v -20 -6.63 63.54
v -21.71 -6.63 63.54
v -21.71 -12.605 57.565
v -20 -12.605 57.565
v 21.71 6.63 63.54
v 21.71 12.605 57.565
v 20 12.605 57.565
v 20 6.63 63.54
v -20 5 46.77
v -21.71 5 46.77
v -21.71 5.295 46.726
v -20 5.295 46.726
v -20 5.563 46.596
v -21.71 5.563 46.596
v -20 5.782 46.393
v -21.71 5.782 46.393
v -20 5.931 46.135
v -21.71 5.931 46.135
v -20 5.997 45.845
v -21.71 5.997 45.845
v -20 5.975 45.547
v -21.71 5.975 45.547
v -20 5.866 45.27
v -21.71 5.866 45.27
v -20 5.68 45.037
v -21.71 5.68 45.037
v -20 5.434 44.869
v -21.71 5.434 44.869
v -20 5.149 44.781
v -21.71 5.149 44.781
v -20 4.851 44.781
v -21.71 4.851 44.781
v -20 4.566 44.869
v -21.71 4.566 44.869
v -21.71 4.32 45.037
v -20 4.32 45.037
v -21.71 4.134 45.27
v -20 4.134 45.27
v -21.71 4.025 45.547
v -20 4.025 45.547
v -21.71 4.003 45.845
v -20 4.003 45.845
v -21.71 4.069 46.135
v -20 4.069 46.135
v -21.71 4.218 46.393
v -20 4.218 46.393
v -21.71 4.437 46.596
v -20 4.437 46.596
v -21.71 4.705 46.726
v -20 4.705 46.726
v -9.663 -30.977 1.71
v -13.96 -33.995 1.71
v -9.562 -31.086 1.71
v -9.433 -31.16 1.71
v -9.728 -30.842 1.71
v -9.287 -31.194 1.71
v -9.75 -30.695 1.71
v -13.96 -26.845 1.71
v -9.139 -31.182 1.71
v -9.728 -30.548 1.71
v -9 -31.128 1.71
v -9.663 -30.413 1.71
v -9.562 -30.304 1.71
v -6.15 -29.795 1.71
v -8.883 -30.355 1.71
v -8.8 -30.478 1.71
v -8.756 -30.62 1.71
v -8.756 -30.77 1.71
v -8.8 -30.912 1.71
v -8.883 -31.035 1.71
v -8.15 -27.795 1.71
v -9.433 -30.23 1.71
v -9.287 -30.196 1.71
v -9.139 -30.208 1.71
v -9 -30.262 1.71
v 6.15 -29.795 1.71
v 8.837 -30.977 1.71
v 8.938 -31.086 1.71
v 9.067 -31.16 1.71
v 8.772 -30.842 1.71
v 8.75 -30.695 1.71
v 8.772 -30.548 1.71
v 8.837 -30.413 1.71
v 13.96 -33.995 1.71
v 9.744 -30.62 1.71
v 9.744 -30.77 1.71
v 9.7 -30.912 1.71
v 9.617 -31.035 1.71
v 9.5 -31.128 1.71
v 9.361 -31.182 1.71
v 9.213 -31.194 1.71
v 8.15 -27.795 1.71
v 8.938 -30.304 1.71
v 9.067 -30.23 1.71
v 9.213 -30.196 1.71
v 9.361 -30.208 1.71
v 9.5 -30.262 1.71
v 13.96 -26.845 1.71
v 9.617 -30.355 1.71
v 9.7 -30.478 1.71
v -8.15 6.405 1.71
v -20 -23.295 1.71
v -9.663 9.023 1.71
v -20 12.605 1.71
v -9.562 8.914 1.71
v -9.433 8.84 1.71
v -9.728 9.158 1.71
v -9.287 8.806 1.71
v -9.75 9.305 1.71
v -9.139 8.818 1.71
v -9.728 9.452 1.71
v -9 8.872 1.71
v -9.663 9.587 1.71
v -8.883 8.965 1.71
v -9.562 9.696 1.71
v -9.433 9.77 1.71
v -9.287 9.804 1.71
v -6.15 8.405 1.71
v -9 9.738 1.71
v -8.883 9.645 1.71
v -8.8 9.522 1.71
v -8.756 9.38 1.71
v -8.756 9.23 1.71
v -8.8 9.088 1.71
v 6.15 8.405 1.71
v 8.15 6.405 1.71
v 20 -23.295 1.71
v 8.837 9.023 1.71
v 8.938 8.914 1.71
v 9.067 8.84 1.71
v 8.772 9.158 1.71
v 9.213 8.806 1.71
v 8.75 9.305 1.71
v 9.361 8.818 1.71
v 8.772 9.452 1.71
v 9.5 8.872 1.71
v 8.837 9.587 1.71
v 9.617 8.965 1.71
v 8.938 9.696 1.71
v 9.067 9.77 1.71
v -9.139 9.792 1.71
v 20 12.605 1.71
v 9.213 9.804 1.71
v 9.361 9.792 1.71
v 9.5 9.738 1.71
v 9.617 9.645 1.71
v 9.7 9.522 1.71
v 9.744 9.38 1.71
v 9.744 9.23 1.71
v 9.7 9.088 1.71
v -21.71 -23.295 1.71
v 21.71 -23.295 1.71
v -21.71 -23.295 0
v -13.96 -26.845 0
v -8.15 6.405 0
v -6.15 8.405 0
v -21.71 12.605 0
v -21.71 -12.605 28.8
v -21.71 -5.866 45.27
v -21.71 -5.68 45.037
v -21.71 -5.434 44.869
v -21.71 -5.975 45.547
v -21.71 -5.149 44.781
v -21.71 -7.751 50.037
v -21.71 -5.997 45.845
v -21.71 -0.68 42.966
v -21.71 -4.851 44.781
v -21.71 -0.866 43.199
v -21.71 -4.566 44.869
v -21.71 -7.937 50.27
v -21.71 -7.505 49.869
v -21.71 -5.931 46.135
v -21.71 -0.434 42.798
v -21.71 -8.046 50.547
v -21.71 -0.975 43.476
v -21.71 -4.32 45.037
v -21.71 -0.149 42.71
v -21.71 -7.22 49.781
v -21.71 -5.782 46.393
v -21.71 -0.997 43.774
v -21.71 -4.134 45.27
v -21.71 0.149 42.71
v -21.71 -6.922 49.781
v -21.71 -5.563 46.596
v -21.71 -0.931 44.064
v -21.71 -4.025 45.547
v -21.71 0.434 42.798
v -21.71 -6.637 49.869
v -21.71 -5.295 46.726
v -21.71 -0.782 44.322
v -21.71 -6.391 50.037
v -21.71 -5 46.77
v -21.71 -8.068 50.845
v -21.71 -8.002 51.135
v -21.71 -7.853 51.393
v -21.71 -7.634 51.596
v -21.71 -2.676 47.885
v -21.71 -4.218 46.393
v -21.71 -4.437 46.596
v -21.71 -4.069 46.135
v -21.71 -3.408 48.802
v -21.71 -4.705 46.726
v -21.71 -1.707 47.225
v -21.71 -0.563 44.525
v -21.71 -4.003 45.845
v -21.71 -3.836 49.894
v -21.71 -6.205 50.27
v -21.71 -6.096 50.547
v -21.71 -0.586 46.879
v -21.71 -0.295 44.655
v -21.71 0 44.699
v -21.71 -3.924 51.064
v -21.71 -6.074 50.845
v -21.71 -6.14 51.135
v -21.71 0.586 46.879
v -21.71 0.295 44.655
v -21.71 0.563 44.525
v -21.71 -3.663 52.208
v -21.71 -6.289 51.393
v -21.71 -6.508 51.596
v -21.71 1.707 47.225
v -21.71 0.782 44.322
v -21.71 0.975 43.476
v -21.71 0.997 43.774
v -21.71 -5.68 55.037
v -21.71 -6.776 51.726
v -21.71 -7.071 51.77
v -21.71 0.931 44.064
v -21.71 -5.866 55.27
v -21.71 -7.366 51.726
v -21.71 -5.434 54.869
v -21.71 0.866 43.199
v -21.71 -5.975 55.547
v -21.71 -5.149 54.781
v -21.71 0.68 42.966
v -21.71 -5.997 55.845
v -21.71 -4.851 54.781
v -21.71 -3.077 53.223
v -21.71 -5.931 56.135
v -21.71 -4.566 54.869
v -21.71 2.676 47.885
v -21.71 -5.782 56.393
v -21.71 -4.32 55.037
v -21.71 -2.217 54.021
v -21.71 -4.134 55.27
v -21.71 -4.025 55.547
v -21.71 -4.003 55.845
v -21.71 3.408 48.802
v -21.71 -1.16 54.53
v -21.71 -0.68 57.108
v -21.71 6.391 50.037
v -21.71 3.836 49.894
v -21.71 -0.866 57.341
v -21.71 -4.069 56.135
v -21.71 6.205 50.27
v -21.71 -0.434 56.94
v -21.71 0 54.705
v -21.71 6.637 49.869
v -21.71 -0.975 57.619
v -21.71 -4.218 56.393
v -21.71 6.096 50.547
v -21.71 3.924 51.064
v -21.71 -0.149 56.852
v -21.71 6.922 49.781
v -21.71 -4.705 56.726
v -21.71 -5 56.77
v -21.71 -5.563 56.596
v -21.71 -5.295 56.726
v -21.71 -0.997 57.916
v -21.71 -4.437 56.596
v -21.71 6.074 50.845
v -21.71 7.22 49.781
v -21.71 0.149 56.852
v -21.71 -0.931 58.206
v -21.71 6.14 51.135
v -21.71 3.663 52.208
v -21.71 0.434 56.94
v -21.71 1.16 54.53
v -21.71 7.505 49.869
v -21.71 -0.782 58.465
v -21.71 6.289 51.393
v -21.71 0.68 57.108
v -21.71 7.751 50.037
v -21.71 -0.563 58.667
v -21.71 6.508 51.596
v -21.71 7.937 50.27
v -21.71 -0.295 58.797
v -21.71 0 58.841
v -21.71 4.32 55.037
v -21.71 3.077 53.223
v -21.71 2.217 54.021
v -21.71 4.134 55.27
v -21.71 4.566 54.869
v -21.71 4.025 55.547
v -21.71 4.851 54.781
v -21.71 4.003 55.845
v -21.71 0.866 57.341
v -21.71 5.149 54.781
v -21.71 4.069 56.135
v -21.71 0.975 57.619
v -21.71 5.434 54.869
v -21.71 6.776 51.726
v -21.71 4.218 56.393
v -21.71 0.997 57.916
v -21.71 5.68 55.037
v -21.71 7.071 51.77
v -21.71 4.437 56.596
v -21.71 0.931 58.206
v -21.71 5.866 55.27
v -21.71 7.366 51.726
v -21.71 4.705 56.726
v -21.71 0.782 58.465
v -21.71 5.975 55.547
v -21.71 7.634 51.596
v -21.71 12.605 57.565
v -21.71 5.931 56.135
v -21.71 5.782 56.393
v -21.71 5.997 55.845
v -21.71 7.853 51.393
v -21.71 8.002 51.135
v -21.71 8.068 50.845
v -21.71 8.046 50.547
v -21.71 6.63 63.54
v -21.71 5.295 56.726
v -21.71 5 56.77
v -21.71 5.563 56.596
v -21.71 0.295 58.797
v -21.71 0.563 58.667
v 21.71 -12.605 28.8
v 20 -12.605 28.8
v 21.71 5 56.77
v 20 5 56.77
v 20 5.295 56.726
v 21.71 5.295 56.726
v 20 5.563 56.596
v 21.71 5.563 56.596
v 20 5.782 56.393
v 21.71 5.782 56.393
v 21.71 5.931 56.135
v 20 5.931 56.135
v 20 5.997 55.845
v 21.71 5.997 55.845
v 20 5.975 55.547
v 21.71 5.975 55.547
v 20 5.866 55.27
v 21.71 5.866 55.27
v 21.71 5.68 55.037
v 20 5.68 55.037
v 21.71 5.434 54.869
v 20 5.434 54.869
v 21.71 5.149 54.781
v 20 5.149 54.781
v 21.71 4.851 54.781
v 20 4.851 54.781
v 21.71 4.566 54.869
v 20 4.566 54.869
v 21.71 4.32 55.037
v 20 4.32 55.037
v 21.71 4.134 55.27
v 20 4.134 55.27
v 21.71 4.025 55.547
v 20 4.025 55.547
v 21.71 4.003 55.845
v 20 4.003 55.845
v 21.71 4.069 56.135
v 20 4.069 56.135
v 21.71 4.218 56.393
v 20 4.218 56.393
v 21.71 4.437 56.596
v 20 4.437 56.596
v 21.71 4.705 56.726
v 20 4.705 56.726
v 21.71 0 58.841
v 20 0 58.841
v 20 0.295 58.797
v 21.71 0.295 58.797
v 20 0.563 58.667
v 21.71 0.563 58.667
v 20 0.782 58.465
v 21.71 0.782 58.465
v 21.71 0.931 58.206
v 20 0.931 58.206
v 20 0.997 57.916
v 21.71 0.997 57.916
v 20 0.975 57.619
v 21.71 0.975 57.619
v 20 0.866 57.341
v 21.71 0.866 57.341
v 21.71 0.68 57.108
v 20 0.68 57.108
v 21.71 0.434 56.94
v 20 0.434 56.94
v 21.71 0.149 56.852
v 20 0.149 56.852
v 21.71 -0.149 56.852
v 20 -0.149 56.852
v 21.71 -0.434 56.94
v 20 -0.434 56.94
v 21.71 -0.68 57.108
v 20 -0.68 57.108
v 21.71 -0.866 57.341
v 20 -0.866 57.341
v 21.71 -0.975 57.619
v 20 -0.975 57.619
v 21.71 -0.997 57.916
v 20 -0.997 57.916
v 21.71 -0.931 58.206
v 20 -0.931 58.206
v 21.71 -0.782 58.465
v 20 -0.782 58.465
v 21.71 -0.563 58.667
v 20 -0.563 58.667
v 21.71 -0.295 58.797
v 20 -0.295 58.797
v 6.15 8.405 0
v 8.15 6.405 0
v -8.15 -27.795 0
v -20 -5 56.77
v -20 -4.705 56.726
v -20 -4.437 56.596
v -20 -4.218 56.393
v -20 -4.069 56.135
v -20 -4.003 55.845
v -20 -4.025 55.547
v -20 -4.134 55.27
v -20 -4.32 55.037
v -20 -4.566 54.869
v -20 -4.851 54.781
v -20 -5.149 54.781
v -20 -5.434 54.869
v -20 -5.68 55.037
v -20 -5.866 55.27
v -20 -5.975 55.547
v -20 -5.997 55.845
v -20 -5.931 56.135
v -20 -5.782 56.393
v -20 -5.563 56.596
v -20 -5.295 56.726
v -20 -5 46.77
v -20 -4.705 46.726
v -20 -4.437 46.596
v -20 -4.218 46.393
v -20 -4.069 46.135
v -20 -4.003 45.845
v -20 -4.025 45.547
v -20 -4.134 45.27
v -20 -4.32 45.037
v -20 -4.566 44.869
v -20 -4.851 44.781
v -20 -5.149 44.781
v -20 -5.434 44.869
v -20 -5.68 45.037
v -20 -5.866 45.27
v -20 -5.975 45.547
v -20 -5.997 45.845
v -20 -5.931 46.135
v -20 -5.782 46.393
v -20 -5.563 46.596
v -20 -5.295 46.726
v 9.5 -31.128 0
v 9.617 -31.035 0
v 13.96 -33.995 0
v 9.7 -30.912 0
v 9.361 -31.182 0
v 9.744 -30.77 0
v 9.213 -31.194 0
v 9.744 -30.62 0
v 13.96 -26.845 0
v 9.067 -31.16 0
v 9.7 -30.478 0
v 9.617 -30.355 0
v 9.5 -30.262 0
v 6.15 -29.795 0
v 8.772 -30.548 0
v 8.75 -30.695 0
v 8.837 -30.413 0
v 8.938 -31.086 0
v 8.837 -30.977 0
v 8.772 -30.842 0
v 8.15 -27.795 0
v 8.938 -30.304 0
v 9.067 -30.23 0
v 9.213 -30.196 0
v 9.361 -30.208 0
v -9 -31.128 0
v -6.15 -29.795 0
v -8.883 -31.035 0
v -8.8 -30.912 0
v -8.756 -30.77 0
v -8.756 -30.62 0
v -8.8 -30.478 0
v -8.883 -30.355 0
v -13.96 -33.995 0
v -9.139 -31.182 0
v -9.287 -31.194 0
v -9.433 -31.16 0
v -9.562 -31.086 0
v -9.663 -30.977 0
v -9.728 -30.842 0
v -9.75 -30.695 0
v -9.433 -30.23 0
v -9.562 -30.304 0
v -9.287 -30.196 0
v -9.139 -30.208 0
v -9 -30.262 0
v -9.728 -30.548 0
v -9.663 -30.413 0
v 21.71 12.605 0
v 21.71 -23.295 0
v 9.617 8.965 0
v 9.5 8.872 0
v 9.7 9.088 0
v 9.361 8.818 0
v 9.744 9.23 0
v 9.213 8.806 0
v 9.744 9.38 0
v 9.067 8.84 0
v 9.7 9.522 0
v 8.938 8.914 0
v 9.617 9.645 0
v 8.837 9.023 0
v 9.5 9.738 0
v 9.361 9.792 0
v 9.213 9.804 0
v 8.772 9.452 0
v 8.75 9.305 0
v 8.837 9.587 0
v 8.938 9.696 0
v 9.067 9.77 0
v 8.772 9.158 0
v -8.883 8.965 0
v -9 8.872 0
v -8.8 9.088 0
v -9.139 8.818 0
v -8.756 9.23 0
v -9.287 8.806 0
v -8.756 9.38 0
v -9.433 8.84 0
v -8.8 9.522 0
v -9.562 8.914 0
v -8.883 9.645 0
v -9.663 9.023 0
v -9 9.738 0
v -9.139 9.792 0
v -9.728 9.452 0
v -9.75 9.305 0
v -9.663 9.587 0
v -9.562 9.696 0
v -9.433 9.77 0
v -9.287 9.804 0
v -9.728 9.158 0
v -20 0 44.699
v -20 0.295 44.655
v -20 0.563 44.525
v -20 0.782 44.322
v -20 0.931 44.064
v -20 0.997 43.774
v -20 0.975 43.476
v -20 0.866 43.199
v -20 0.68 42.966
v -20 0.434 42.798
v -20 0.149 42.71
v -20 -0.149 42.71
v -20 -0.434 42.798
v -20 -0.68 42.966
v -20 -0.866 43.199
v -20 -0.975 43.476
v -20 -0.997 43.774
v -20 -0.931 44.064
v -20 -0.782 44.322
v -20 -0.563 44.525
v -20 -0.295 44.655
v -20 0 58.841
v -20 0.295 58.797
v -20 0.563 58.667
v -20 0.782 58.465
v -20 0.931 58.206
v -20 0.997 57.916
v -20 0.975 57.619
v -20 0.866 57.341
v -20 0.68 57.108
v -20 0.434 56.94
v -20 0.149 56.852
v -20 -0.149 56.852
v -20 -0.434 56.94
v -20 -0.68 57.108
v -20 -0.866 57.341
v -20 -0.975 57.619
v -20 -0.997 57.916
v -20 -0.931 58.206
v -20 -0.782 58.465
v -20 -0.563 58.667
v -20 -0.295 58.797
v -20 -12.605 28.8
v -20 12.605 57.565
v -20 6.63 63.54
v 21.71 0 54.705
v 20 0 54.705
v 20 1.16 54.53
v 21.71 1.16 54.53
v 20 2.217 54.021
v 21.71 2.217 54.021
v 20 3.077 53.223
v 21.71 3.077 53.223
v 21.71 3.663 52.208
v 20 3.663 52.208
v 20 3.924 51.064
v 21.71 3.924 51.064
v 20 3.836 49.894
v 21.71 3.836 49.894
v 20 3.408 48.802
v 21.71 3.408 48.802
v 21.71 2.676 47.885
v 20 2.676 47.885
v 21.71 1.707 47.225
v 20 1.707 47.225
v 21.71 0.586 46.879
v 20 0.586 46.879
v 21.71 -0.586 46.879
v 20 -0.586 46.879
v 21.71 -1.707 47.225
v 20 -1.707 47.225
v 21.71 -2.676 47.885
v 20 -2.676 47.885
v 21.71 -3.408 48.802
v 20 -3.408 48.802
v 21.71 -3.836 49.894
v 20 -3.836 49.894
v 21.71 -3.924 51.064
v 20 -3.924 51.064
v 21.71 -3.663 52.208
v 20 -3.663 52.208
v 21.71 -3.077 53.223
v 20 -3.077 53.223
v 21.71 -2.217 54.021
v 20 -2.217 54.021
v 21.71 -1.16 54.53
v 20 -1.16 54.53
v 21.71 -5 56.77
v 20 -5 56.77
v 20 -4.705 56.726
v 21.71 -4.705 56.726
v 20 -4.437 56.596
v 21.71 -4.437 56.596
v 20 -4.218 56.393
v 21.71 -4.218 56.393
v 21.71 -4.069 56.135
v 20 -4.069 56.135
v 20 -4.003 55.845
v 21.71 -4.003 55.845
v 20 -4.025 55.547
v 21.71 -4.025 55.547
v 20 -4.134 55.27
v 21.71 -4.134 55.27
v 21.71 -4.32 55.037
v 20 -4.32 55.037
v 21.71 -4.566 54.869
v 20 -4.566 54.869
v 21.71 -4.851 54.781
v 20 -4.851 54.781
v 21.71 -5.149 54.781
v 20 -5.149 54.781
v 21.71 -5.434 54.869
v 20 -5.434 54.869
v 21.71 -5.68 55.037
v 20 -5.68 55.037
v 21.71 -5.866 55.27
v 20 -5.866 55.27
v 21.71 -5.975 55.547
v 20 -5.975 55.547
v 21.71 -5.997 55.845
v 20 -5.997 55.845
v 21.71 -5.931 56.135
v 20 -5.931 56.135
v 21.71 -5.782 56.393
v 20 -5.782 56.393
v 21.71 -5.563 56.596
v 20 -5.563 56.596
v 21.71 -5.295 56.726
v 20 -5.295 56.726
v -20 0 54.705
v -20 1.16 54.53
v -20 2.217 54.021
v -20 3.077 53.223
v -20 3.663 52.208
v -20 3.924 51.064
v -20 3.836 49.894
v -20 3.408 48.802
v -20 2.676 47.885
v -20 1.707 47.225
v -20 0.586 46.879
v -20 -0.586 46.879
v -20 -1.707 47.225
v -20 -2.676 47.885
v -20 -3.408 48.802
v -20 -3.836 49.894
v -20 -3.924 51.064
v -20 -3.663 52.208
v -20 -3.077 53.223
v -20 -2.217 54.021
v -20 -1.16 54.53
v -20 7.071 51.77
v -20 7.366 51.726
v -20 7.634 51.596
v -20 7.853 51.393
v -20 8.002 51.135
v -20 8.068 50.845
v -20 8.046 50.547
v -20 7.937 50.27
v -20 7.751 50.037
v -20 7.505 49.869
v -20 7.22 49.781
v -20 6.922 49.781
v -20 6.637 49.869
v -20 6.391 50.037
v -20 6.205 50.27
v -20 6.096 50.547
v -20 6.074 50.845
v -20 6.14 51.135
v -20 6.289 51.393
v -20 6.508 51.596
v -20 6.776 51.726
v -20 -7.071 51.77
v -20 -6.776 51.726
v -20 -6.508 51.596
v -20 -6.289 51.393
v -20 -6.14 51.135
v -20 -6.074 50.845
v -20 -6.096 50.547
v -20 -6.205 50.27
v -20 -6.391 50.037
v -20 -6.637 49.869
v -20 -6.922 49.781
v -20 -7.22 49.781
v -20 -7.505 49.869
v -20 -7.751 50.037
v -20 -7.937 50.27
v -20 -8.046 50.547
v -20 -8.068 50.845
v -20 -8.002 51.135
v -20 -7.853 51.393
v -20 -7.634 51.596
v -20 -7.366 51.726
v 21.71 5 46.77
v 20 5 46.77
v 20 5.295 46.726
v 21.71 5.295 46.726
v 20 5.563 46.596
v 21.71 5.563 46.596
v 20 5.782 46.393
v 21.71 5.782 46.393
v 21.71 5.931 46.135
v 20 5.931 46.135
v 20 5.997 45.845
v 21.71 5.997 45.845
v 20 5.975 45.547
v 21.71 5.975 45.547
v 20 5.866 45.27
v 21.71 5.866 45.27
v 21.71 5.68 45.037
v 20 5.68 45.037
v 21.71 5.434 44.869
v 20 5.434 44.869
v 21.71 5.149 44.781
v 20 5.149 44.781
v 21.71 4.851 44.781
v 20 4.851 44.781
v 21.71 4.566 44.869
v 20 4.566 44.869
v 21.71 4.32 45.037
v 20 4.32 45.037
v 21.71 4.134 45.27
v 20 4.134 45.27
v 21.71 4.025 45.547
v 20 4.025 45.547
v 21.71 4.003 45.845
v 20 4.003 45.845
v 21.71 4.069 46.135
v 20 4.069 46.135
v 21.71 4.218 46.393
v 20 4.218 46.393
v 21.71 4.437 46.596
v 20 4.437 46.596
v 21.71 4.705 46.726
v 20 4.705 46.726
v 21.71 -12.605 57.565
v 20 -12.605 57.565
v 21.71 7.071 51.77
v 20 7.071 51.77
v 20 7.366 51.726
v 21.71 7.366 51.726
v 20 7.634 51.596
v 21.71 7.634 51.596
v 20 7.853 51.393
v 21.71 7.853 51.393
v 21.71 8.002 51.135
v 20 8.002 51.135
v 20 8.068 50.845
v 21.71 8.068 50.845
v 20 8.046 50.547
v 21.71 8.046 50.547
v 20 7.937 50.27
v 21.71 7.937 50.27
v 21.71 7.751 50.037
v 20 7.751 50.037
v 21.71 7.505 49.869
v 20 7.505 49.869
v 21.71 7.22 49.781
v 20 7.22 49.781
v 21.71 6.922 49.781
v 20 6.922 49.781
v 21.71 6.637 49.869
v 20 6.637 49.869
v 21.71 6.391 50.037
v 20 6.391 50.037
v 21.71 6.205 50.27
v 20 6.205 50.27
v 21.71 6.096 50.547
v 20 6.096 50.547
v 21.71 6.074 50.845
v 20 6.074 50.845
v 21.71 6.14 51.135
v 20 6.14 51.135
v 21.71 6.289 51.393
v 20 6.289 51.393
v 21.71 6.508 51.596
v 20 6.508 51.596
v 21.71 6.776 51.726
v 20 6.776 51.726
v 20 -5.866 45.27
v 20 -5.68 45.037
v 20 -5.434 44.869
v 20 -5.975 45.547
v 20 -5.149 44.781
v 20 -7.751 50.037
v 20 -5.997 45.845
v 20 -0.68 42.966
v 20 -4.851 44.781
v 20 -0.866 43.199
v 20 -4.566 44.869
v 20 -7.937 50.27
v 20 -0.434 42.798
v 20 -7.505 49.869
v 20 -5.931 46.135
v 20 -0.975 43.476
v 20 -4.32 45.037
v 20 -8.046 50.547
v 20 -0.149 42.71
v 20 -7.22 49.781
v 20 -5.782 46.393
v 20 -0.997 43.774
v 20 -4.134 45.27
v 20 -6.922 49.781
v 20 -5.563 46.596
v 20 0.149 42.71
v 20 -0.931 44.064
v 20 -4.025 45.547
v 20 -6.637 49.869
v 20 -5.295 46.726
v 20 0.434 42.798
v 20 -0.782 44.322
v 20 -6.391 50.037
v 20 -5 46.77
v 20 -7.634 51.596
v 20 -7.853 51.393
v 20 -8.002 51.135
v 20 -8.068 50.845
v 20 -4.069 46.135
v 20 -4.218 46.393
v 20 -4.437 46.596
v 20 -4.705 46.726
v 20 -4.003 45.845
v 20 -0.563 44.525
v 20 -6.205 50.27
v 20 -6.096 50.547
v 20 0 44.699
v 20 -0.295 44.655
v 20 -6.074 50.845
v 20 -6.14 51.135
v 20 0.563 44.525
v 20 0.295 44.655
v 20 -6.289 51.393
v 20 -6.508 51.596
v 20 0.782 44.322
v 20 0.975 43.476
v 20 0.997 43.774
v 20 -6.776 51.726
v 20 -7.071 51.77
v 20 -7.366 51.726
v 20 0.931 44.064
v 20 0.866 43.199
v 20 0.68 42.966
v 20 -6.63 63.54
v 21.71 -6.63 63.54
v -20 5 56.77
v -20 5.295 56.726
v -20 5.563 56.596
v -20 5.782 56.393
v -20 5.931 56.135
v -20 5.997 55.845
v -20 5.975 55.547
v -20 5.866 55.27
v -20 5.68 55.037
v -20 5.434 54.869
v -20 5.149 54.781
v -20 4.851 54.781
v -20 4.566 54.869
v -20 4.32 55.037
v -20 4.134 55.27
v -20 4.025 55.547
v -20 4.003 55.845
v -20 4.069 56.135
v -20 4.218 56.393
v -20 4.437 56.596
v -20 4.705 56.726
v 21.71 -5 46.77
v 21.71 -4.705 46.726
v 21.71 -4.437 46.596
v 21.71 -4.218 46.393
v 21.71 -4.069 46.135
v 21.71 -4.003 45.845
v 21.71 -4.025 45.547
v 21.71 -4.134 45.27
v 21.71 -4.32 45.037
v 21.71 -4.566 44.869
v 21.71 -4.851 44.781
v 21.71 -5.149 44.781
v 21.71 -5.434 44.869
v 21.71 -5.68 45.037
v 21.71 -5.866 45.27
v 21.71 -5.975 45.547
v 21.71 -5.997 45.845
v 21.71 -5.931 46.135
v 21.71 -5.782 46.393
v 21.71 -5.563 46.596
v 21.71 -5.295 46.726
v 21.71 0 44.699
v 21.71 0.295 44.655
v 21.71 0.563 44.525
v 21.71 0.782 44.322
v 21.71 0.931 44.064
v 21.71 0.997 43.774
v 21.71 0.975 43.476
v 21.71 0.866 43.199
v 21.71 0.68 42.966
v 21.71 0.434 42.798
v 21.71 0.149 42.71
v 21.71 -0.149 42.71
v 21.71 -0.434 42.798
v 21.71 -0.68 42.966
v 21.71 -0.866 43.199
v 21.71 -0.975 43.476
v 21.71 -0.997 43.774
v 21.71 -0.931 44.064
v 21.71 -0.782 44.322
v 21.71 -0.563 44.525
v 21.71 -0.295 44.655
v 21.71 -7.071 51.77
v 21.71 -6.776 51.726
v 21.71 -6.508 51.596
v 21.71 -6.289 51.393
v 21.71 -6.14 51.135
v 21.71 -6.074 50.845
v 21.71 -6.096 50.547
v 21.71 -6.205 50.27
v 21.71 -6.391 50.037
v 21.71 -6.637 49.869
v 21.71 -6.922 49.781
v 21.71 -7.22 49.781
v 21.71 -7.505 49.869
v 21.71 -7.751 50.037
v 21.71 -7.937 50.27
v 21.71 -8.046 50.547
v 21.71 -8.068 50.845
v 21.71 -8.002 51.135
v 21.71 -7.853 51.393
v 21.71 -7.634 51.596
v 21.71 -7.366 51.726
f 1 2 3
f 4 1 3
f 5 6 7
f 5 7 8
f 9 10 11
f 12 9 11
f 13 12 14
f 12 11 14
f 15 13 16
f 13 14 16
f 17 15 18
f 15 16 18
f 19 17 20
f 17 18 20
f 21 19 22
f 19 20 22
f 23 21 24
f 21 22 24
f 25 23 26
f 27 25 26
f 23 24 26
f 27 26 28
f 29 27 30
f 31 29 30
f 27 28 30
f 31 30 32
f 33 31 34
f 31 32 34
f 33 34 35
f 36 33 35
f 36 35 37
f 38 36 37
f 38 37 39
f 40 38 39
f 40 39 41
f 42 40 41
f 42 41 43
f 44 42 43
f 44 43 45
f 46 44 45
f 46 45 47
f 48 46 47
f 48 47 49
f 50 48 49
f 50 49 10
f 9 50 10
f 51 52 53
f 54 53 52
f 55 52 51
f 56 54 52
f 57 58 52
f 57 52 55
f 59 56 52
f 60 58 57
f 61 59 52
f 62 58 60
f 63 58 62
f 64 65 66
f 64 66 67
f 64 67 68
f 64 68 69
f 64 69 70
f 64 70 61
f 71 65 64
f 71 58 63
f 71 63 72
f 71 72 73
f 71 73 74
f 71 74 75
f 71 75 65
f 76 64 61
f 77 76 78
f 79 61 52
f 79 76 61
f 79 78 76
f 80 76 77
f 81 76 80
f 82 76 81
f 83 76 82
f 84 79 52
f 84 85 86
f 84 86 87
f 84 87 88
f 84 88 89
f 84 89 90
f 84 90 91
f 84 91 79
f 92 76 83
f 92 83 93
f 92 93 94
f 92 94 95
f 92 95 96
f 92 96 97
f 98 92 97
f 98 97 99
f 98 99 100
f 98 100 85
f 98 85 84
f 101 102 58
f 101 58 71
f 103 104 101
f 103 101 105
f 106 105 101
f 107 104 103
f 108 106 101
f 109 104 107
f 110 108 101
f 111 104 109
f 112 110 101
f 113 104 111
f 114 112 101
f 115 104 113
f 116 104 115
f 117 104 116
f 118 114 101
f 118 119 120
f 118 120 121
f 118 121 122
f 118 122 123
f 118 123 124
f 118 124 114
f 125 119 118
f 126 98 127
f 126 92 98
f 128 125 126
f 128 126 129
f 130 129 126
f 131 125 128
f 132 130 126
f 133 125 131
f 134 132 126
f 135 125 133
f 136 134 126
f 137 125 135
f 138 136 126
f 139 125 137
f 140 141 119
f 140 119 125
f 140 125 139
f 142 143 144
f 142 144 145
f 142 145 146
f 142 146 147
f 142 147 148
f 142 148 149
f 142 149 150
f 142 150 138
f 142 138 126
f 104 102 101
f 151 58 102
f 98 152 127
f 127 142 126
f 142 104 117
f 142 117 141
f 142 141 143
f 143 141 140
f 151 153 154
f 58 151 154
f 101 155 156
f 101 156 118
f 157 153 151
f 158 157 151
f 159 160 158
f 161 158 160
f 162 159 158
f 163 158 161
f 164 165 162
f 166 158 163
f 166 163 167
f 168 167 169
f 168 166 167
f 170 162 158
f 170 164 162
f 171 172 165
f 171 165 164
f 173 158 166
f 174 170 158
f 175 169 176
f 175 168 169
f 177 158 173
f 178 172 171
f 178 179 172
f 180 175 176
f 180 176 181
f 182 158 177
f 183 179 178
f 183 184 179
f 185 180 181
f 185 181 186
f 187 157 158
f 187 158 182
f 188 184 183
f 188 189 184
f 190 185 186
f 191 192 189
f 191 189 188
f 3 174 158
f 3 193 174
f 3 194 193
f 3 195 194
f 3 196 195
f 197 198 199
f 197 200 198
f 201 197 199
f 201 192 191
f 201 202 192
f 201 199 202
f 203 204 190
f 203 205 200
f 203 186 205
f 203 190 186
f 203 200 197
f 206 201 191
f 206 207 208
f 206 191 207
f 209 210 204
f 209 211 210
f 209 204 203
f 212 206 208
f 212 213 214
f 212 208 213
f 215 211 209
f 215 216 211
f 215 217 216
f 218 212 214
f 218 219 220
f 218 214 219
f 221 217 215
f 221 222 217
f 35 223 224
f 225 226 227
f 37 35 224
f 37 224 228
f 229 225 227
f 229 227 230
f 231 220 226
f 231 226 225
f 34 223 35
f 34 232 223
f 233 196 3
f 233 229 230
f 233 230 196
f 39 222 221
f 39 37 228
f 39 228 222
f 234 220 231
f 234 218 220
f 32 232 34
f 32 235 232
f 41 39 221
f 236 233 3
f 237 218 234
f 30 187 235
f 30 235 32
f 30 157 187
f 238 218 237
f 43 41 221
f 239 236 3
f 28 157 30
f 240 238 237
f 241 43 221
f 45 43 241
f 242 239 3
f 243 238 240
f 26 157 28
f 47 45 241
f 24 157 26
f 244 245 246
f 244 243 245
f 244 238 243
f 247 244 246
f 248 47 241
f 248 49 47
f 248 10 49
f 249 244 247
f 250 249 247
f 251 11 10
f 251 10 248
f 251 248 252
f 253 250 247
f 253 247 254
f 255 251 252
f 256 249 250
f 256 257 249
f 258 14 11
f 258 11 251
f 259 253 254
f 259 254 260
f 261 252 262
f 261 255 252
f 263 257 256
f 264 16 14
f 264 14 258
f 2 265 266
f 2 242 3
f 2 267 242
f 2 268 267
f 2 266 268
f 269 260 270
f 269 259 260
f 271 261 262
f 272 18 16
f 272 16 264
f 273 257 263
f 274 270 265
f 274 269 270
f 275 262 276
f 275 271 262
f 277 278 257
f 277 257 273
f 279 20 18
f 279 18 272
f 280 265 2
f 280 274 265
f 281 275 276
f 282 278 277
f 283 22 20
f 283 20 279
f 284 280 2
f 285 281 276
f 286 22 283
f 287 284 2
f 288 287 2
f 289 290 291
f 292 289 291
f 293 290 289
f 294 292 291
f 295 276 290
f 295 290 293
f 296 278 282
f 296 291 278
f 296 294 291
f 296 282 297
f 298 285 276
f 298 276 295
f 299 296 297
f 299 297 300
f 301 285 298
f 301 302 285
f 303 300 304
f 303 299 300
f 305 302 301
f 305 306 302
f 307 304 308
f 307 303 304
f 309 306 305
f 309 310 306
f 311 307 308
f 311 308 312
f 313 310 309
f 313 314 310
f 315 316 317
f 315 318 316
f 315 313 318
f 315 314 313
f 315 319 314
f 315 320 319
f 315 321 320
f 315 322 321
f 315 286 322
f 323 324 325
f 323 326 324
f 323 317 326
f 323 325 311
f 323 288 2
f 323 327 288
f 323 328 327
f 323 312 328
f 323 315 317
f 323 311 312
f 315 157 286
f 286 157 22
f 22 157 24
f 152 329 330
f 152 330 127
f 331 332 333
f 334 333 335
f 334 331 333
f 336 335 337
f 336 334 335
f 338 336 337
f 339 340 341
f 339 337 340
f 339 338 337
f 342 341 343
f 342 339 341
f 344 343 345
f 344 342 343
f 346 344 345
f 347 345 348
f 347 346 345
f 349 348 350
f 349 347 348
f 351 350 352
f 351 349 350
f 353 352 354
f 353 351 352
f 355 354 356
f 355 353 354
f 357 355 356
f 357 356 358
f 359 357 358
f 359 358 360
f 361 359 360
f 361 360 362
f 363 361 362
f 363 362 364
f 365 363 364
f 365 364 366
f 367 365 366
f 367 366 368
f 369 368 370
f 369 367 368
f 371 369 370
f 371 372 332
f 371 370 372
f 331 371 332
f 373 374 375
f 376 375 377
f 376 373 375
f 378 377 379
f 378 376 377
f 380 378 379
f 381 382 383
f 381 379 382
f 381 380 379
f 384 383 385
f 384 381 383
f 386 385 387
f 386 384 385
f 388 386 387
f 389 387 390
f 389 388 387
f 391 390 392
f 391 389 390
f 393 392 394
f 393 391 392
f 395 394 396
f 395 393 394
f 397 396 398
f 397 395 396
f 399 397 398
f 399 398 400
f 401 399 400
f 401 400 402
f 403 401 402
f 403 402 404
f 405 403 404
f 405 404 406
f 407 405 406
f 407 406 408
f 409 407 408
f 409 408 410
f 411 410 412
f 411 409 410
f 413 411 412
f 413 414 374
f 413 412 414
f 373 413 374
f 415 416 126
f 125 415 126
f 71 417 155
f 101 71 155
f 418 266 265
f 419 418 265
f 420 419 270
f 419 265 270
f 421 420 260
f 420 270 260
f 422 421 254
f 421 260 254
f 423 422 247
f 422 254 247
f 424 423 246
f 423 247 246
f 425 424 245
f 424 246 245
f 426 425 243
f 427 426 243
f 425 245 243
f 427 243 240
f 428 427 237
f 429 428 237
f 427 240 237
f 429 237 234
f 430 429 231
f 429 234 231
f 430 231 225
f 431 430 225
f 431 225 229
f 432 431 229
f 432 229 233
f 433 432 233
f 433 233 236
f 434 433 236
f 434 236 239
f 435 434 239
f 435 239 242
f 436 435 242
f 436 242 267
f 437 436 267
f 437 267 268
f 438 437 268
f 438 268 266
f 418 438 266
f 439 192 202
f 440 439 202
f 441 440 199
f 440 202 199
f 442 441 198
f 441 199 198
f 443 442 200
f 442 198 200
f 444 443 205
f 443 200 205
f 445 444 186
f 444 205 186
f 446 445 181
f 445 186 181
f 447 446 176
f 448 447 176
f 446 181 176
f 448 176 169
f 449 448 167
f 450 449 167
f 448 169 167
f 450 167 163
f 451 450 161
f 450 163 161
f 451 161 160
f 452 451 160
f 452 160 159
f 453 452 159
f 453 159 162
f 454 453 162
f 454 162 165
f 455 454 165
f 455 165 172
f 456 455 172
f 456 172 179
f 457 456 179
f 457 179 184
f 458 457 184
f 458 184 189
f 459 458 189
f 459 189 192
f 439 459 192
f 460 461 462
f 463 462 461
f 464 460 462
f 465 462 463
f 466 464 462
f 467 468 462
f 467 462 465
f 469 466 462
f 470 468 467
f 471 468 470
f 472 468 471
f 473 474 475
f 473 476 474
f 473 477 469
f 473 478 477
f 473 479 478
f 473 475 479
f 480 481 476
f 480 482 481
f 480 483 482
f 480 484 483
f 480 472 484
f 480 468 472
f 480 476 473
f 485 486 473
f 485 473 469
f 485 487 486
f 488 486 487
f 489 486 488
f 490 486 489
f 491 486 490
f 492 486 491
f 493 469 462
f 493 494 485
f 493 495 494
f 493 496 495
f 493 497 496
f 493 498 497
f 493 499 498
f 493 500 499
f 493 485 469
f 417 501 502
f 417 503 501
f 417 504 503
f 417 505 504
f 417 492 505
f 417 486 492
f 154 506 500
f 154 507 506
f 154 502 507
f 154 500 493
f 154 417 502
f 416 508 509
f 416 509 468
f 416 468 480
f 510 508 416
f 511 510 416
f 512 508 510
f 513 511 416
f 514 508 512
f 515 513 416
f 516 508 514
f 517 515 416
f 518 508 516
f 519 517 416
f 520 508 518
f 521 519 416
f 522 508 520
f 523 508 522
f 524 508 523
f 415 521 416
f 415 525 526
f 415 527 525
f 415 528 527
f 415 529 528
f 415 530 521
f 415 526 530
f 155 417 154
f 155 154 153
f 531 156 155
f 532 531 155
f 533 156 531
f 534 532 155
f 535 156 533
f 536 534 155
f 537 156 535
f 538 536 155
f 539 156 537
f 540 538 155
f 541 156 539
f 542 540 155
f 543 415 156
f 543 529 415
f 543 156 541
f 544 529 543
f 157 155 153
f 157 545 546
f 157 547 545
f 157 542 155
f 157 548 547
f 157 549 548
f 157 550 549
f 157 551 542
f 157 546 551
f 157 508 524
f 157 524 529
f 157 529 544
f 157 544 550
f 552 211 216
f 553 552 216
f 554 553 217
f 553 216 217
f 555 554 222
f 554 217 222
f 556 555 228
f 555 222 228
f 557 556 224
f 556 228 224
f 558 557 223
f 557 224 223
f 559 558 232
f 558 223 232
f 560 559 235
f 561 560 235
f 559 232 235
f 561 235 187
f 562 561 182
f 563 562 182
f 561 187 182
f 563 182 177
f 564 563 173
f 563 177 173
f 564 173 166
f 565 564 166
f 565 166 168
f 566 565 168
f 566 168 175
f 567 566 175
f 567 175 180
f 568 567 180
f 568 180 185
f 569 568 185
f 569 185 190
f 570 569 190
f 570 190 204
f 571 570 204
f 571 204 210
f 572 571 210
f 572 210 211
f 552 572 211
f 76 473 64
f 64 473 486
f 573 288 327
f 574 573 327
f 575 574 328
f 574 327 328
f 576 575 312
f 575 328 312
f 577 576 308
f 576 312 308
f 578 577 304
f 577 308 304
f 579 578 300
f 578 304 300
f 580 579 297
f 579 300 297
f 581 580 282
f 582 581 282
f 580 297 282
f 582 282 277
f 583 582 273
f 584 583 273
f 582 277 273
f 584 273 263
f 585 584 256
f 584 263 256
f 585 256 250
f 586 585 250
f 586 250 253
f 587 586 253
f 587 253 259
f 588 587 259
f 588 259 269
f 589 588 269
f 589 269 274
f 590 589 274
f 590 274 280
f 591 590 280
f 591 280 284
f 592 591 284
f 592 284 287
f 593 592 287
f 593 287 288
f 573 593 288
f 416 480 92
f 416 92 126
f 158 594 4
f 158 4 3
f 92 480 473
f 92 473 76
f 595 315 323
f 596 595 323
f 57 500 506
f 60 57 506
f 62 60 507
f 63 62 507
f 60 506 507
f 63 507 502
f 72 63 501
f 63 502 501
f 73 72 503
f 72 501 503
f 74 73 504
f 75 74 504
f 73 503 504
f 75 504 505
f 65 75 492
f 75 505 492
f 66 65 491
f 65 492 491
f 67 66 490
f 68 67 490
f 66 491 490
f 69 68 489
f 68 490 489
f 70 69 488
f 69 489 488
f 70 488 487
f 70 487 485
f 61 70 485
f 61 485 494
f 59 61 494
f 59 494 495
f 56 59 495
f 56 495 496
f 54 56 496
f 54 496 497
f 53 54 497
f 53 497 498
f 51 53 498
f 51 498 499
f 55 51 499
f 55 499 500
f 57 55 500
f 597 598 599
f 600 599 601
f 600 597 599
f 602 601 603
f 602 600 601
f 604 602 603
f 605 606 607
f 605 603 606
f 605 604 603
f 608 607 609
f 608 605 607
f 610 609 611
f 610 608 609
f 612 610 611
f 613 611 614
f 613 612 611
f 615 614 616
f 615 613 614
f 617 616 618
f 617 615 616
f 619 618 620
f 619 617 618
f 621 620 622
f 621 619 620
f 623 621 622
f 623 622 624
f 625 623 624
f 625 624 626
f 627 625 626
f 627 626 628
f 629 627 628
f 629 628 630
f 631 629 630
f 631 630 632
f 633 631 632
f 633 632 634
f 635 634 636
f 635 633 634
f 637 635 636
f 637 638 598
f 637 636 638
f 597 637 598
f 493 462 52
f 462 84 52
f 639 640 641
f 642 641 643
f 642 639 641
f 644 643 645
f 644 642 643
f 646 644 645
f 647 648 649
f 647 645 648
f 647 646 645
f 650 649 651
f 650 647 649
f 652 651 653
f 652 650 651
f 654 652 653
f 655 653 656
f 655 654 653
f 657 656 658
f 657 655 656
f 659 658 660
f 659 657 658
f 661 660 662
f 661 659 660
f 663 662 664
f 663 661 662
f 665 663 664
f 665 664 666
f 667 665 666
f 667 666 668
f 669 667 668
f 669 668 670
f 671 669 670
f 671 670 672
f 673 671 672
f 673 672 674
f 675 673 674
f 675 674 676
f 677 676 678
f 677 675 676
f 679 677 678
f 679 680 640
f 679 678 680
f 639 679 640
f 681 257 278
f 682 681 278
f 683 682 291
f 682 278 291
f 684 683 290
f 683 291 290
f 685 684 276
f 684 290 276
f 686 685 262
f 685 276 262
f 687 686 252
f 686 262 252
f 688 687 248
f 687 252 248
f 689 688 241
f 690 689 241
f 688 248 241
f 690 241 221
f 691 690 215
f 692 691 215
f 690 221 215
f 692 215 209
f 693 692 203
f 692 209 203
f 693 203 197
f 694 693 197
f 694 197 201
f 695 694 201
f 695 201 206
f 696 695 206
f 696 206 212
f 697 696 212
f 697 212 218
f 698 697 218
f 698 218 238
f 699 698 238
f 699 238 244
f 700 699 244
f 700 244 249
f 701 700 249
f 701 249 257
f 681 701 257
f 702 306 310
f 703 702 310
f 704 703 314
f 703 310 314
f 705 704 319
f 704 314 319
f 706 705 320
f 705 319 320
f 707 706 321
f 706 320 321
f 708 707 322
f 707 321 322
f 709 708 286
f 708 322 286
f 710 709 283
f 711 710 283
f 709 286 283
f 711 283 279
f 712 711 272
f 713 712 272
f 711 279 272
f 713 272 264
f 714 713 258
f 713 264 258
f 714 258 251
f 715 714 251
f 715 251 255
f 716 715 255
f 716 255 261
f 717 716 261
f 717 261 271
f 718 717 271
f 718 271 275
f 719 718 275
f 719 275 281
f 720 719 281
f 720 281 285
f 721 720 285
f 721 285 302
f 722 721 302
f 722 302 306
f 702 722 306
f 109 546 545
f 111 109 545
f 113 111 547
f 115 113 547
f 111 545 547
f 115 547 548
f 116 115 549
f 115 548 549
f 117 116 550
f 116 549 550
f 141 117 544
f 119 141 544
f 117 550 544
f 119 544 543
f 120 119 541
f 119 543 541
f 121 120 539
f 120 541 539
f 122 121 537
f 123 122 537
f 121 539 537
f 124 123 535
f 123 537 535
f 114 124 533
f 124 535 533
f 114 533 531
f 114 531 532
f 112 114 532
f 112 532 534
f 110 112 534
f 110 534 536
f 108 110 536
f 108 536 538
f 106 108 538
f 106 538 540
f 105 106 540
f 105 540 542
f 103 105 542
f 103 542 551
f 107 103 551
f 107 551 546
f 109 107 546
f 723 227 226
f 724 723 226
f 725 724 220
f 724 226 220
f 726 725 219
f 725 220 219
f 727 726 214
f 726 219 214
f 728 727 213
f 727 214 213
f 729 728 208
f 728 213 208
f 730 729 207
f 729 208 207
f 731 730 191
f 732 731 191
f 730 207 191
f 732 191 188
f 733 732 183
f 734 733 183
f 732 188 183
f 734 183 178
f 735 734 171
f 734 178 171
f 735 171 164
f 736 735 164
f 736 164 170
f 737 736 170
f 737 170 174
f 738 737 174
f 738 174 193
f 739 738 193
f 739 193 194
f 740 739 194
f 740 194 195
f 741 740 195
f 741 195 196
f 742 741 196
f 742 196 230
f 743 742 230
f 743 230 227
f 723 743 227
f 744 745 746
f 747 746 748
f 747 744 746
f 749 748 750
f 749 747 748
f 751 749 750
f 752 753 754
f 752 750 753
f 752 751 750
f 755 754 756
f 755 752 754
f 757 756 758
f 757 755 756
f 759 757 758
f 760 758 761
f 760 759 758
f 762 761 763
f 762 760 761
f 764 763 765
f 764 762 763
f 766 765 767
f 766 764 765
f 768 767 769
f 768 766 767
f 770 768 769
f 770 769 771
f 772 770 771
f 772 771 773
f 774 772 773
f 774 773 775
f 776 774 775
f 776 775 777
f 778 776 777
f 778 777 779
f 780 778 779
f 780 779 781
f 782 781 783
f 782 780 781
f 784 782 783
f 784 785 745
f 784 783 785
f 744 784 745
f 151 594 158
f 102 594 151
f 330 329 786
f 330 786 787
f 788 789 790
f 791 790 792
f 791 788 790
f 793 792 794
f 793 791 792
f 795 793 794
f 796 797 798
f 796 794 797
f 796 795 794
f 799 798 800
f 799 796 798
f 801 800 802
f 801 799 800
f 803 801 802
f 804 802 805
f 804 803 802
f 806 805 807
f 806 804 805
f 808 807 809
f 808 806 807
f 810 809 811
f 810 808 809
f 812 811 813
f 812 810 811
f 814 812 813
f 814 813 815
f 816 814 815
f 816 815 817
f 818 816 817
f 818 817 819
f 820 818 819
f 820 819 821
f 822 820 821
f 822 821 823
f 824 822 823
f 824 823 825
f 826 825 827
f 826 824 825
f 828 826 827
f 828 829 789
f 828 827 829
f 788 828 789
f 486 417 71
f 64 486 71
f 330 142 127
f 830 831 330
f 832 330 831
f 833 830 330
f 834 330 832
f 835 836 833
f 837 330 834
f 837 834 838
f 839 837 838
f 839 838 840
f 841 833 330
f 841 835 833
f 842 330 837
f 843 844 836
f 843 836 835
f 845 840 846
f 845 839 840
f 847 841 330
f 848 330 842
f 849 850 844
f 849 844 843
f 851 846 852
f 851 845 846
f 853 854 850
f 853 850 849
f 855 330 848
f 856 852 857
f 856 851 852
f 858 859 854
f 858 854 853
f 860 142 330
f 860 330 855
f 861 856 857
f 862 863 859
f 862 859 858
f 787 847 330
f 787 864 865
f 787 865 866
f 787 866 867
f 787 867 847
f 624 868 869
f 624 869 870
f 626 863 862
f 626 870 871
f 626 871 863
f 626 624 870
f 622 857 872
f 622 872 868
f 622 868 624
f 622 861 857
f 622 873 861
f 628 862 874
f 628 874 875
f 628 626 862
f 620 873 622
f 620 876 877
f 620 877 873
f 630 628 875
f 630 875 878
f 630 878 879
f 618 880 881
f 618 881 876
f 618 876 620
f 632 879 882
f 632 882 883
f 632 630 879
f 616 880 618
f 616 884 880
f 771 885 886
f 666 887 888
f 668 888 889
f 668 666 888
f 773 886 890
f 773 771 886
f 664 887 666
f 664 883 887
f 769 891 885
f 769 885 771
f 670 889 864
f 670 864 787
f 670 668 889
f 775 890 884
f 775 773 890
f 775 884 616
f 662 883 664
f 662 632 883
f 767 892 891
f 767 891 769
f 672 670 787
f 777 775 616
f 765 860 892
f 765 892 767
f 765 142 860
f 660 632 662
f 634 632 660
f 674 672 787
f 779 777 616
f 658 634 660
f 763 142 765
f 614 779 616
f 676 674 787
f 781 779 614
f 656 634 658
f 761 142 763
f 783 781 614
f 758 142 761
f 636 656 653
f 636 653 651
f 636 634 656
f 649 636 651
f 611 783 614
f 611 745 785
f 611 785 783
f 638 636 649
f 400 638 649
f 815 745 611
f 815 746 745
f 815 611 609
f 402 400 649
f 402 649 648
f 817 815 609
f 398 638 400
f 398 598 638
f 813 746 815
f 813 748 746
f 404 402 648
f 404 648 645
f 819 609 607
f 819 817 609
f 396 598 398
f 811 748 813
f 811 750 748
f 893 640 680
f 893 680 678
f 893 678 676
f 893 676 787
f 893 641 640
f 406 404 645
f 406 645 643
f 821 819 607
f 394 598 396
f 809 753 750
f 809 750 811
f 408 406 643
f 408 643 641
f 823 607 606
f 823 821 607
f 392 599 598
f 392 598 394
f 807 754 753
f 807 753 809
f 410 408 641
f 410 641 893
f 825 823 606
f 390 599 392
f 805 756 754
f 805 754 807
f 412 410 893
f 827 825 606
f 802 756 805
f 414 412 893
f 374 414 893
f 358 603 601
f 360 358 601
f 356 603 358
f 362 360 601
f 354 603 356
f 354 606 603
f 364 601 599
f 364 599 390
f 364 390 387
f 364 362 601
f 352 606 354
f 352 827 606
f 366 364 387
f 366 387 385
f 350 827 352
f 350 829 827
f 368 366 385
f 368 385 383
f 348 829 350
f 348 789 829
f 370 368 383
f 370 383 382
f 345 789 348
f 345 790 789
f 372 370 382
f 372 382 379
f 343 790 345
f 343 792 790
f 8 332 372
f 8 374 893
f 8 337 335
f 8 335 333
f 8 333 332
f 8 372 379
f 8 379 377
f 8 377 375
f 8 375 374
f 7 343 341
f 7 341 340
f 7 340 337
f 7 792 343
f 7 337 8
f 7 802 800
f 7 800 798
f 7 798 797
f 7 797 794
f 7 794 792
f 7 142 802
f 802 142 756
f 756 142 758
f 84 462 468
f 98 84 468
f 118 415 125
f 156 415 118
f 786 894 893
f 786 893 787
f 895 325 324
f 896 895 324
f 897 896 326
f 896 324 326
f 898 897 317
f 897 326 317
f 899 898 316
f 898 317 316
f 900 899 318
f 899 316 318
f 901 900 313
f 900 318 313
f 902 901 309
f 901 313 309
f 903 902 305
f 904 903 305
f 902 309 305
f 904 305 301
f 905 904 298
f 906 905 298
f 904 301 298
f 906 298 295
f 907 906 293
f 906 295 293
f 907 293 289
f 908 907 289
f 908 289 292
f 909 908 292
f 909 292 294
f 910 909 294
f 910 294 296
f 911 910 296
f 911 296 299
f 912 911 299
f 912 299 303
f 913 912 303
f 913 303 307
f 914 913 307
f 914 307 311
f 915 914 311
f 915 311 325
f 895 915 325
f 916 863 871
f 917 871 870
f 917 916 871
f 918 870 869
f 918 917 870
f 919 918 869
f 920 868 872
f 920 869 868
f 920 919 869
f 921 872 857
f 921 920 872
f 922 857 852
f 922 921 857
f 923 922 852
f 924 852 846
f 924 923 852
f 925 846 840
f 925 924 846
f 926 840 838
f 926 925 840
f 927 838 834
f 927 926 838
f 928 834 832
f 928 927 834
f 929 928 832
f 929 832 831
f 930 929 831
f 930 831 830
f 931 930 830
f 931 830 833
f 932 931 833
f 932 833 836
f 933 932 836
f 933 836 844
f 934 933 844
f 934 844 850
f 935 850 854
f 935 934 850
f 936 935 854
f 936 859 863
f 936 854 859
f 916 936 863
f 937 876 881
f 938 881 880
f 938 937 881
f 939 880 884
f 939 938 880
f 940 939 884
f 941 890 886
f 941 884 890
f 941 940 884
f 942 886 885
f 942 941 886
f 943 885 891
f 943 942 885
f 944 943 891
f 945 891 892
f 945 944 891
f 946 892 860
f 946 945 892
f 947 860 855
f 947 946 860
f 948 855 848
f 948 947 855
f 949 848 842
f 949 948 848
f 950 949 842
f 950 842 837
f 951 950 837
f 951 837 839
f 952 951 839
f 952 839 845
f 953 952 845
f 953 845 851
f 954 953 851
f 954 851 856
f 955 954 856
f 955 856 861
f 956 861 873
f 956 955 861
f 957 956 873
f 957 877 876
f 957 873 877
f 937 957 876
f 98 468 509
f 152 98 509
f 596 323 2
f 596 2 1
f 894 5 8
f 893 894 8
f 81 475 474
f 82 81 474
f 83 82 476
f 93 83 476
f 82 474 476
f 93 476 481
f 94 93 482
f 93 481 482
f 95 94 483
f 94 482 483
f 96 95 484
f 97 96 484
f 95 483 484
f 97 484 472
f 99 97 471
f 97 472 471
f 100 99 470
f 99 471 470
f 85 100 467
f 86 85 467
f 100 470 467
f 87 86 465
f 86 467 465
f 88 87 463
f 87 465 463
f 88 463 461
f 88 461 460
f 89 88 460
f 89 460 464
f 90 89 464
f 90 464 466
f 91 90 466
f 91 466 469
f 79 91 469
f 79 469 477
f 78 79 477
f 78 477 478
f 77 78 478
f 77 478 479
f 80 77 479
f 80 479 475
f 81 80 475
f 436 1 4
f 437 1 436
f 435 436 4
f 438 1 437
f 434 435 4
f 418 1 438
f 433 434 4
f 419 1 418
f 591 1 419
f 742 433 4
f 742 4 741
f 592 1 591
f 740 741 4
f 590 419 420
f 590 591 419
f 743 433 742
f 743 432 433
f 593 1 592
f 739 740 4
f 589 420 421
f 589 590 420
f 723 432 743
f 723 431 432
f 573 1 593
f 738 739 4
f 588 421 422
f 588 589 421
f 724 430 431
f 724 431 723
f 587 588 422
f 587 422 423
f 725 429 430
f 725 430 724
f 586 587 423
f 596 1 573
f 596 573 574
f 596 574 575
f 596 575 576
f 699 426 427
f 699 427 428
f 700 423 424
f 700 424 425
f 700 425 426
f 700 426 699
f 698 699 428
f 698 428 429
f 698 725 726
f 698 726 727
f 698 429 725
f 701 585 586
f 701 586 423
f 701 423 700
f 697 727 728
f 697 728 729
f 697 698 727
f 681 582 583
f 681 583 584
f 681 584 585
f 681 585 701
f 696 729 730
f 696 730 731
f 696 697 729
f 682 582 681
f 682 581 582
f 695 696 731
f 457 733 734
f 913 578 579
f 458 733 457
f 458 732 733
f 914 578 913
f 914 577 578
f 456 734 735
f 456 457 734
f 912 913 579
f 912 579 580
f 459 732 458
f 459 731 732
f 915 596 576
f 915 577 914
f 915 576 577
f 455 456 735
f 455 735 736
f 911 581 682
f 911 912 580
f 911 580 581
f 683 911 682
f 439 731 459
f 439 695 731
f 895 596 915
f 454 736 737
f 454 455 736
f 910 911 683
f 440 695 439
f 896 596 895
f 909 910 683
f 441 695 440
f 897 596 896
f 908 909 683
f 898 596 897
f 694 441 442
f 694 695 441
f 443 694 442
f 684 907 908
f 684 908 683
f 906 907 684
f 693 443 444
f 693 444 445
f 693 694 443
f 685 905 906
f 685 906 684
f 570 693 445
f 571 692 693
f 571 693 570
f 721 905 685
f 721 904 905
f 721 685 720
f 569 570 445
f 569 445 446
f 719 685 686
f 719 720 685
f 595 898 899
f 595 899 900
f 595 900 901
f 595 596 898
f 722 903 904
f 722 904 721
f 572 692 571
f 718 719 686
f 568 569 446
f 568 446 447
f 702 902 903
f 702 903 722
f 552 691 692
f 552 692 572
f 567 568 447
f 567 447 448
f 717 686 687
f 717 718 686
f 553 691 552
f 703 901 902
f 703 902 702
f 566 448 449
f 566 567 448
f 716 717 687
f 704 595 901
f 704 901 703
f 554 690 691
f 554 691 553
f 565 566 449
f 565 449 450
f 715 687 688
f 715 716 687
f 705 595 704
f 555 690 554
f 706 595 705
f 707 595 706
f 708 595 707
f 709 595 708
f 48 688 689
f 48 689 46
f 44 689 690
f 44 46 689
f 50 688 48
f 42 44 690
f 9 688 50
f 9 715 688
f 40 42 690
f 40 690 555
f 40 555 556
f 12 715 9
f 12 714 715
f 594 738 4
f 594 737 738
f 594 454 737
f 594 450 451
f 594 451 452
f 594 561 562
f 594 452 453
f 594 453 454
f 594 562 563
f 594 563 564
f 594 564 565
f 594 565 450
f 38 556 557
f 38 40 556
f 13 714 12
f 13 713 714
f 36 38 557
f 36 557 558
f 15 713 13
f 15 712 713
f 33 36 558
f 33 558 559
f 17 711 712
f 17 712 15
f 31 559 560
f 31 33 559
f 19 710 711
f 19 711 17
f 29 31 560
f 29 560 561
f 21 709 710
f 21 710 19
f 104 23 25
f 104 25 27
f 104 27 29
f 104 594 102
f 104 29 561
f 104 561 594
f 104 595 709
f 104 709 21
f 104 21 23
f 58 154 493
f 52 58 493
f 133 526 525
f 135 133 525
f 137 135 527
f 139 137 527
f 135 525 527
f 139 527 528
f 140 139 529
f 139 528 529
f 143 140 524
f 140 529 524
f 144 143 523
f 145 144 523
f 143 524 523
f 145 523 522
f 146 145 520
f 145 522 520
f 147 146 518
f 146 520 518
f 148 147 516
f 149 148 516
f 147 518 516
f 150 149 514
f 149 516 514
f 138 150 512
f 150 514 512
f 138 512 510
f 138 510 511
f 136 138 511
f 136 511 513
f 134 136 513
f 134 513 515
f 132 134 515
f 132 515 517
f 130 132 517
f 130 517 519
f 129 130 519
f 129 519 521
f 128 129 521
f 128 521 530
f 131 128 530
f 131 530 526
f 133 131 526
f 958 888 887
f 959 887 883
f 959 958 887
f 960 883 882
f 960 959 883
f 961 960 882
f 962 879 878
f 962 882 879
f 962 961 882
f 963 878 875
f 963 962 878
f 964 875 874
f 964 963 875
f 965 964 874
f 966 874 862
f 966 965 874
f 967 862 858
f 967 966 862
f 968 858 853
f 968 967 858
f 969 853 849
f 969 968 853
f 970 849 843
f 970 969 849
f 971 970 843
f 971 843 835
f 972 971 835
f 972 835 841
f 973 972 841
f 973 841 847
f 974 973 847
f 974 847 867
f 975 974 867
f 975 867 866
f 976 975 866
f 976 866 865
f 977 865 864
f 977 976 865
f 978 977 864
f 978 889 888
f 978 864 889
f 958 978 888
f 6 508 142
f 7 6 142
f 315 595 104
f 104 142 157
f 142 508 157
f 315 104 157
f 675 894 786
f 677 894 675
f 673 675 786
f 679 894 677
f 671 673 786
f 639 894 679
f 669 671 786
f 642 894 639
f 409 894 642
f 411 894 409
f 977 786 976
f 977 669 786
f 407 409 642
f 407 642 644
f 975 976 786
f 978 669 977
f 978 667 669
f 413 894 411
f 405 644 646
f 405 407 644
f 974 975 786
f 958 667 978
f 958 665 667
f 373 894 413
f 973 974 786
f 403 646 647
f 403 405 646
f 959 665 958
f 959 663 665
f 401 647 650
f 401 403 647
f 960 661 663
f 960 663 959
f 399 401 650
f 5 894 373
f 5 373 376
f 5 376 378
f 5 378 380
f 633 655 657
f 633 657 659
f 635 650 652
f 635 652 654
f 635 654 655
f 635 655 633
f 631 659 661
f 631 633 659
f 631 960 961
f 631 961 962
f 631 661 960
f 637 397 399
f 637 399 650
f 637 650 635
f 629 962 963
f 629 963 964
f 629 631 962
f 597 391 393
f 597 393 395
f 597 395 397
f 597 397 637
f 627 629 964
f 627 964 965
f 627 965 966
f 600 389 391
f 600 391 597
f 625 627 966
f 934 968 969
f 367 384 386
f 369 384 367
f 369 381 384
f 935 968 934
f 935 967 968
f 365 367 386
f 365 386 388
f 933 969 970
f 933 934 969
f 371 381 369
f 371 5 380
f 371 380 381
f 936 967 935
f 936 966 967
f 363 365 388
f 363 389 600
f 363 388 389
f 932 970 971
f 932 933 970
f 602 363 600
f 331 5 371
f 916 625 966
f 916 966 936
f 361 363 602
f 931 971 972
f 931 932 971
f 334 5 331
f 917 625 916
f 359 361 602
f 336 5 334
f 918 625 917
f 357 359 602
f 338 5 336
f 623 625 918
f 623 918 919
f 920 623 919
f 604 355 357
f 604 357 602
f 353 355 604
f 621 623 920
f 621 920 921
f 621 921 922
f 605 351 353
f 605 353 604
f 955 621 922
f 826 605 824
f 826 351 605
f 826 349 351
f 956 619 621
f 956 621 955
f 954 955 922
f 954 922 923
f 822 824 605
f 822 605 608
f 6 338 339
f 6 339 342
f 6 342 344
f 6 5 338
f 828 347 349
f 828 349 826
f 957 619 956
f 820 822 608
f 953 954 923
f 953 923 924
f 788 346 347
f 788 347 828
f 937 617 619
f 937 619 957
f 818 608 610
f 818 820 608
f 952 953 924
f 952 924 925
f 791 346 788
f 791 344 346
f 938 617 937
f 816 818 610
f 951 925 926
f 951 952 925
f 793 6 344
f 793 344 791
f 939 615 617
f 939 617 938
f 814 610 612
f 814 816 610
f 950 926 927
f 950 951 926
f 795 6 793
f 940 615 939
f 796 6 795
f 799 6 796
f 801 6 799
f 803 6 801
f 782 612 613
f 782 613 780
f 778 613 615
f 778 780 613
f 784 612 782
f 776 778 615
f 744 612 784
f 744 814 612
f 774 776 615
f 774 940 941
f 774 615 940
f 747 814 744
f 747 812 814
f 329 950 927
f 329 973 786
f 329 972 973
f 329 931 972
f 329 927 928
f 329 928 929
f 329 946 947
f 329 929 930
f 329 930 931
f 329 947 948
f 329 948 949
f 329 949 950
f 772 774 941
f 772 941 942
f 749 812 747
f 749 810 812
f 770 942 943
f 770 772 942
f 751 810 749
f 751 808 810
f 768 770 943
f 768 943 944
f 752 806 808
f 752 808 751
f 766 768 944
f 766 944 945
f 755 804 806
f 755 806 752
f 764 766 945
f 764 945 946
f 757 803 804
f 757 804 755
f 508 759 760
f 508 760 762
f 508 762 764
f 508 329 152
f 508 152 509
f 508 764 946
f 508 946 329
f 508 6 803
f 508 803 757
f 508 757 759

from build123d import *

# Parameters (mm, degrees)
BOSS_EXTRUDE1_DEPTH = 12.605
CUT_EXTRUDE1_DEPTH  = 32.2
SKETCH3_R           = 3.935
SKETCH3_R_2         = 1
CUT_EXTRUDE2_DEPTH  = 32.2
BOSS_EXTRUDE2_DEPTH = 21.39
SKETCH6_R           = 0.5
SKETCH6_W           = 16.3
SKETCH6_H           = 38.2
CUT_EXTRUDE4_DEPTH  = 45
CUT_EXTRUDE5_DEPTH  = 68
CHAMFER3_SIZE       = 2


with BuildPart() as part:
    # Sketch1 → Boss-Extrude1 (new, symmetric)
    with BuildSketch(Plane(origin=(0, 0, 0), x_dir=(1, 0, 0), z_dir=(0, 1, 0))):
        Polygon((0, 0), (-21.71, 0), (-21.71, -63.54), (-20, -63.54), (-20, -1.71), (0, -1.71), align=None)
    boss_extrude1 = extrude(amount=BOSS_EXTRUDE1_DEPTH, both=True)

    # Sketch2 → Cut-Extrude1 (cut)
    with BuildSketch(Plane.ZY.offset(21.71)):
        Polygon((57.565, 12.605), (63.54, 6.63), (63.54, 12.605), align=None)
        Polygon((63.54, -6.63), (57.565, -12.605), (63.54, -12.605), align=None)
    cut_extrude1 = extrude(amount=-CUT_EXTRUDE1_DEPTH, mode=Mode.SUBTRACT)

    # Sketch3 → Cut-Extrude2 (cut)
    with BuildSketch(Plane.ZY.offset(21.71)):
        with Locations((50.77, 0)):
            Circle(SKETCH3_R)
        with Locations((45.77, 5)):
            Circle(SKETCH3_R_2)
        with Locations((55.77, 5)):
            Circle(SKETCH3_R_2)
        with Locations((55.77, -5)):
            Circle(SKETCH3_R_2)
        with Locations((45.77, -5)):
            Circle(SKETCH3_R_2)
        with Locations((43.698932188, 0)):
            Circle(SKETCH3_R_2)
        with Locations((50.77, -7.071067812)):
            Circle(SKETCH3_R_2)
        with Locations((57.841067812, 0)):
            Circle(SKETCH3_R_2)
        with Locations((50.77, 7.071067812)):
            Circle(SKETCH3_R_2)
    cut_extrude2 = extrude(amount=-CUT_EXTRUDE2_DEPTH, mode=Mode.SUBTRACT)

    # Mirror1: Boss-Extrude1, Cut-Extrude1, Cut-Extrude2 across plane
    add(boss_extrude1.mirror(Plane(origin=(0, 12.605, 1.71), x_dir=(0, 0, 1), z_dir=(-1, 0, 0))))
    add(cut_extrude1.mirror(Plane(origin=(0, 12.605, 1.71), x_dir=(0, 0, 1), z_dir=(-1, 0, 0))), mode=Mode.SUBTRACT)
    add(cut_extrude2.mirror(Plane(origin=(0, 12.605, 1.71), x_dir=(0, 0, 1), z_dir=(-1, 0, 0))), mode=Mode.SUBTRACT)

    # Sketch5 → Boss-Extrude2 (add)
    with BuildSketch(Plane.XZ.offset(12.605)):
        Polygon((-21.71, 28.8), (-20, 28.8), (-20, 1.71), (20, 1.71), (20, 28.8), (21.71, 28.8), (21.71, 0), (-21.71, 0), align=None)
    extrude(amount=BOSS_EXTRUDE2_DEPTH)

    # Sketch6 → Cut-Extrude4 (cut)
    with BuildSketch(Plane(origin=(0, 0, 0), x_dir=(-1, 0, 0), z_dir=(0, 0, -1))):
        with Locations((-9.25, 9.305)):
            Circle(SKETCH6_R)
        with Locations((9.25, 9.305)):
            Circle(SKETCH6_R)
        with Locations((9.25, -30.695)):
            Circle(SKETCH6_R)
        with Locations((-9.25, -30.695)):
            Circle(SKETCH6_R)
        Polygon((-21.71, -26.845), (-21.71, -33.995), (-13.96, -33.995), (-13.96, -26.845), (-21.71, -23.295), align=None)
        Polygon((21.71, -23.295), (13.96, -26.845), (13.96, -33.995), (21.71, -33.995), (21.71, -26.845), align=None)
        with Locations((0, -10.695)):
            Rectangle(SKETCH6_W, SKETCH6_H)
    extrude(amount=-CUT_EXTRUDE4_DEPTH, mode=Mode.SUBTRACT)

    # Sketch7 → Cut-Extrude5 (cut)
    with BuildSketch(Plane(origin=(21.71, 0, 0), x_dir=(0, 0, -1), z_dir=(1, 0, 0))):
        Polygon((-28.8, -12.605), (-1.71, -23.295), (-1.71, -35.593839202), (-28.8, -35.593839202), align=None)
    extrude(amount=-CUT_EXTRUDE5_DEPTH, mode=Mode.SUBTRACT)

    # Chamfer3
    chamfer3_edges = [part.edges().sort_by_distance(p)[0] for p in [
        (-8.15, 8.405, 0.855),
        (-8.15, -29.795, 0.855),
        (8.15, -29.795, 0.855),
        (8.15, 8.405, 0.855),
    ]]
    chamfer(chamfer3_edges, length=CHAMFER3_SIZE)


solid = part.part
